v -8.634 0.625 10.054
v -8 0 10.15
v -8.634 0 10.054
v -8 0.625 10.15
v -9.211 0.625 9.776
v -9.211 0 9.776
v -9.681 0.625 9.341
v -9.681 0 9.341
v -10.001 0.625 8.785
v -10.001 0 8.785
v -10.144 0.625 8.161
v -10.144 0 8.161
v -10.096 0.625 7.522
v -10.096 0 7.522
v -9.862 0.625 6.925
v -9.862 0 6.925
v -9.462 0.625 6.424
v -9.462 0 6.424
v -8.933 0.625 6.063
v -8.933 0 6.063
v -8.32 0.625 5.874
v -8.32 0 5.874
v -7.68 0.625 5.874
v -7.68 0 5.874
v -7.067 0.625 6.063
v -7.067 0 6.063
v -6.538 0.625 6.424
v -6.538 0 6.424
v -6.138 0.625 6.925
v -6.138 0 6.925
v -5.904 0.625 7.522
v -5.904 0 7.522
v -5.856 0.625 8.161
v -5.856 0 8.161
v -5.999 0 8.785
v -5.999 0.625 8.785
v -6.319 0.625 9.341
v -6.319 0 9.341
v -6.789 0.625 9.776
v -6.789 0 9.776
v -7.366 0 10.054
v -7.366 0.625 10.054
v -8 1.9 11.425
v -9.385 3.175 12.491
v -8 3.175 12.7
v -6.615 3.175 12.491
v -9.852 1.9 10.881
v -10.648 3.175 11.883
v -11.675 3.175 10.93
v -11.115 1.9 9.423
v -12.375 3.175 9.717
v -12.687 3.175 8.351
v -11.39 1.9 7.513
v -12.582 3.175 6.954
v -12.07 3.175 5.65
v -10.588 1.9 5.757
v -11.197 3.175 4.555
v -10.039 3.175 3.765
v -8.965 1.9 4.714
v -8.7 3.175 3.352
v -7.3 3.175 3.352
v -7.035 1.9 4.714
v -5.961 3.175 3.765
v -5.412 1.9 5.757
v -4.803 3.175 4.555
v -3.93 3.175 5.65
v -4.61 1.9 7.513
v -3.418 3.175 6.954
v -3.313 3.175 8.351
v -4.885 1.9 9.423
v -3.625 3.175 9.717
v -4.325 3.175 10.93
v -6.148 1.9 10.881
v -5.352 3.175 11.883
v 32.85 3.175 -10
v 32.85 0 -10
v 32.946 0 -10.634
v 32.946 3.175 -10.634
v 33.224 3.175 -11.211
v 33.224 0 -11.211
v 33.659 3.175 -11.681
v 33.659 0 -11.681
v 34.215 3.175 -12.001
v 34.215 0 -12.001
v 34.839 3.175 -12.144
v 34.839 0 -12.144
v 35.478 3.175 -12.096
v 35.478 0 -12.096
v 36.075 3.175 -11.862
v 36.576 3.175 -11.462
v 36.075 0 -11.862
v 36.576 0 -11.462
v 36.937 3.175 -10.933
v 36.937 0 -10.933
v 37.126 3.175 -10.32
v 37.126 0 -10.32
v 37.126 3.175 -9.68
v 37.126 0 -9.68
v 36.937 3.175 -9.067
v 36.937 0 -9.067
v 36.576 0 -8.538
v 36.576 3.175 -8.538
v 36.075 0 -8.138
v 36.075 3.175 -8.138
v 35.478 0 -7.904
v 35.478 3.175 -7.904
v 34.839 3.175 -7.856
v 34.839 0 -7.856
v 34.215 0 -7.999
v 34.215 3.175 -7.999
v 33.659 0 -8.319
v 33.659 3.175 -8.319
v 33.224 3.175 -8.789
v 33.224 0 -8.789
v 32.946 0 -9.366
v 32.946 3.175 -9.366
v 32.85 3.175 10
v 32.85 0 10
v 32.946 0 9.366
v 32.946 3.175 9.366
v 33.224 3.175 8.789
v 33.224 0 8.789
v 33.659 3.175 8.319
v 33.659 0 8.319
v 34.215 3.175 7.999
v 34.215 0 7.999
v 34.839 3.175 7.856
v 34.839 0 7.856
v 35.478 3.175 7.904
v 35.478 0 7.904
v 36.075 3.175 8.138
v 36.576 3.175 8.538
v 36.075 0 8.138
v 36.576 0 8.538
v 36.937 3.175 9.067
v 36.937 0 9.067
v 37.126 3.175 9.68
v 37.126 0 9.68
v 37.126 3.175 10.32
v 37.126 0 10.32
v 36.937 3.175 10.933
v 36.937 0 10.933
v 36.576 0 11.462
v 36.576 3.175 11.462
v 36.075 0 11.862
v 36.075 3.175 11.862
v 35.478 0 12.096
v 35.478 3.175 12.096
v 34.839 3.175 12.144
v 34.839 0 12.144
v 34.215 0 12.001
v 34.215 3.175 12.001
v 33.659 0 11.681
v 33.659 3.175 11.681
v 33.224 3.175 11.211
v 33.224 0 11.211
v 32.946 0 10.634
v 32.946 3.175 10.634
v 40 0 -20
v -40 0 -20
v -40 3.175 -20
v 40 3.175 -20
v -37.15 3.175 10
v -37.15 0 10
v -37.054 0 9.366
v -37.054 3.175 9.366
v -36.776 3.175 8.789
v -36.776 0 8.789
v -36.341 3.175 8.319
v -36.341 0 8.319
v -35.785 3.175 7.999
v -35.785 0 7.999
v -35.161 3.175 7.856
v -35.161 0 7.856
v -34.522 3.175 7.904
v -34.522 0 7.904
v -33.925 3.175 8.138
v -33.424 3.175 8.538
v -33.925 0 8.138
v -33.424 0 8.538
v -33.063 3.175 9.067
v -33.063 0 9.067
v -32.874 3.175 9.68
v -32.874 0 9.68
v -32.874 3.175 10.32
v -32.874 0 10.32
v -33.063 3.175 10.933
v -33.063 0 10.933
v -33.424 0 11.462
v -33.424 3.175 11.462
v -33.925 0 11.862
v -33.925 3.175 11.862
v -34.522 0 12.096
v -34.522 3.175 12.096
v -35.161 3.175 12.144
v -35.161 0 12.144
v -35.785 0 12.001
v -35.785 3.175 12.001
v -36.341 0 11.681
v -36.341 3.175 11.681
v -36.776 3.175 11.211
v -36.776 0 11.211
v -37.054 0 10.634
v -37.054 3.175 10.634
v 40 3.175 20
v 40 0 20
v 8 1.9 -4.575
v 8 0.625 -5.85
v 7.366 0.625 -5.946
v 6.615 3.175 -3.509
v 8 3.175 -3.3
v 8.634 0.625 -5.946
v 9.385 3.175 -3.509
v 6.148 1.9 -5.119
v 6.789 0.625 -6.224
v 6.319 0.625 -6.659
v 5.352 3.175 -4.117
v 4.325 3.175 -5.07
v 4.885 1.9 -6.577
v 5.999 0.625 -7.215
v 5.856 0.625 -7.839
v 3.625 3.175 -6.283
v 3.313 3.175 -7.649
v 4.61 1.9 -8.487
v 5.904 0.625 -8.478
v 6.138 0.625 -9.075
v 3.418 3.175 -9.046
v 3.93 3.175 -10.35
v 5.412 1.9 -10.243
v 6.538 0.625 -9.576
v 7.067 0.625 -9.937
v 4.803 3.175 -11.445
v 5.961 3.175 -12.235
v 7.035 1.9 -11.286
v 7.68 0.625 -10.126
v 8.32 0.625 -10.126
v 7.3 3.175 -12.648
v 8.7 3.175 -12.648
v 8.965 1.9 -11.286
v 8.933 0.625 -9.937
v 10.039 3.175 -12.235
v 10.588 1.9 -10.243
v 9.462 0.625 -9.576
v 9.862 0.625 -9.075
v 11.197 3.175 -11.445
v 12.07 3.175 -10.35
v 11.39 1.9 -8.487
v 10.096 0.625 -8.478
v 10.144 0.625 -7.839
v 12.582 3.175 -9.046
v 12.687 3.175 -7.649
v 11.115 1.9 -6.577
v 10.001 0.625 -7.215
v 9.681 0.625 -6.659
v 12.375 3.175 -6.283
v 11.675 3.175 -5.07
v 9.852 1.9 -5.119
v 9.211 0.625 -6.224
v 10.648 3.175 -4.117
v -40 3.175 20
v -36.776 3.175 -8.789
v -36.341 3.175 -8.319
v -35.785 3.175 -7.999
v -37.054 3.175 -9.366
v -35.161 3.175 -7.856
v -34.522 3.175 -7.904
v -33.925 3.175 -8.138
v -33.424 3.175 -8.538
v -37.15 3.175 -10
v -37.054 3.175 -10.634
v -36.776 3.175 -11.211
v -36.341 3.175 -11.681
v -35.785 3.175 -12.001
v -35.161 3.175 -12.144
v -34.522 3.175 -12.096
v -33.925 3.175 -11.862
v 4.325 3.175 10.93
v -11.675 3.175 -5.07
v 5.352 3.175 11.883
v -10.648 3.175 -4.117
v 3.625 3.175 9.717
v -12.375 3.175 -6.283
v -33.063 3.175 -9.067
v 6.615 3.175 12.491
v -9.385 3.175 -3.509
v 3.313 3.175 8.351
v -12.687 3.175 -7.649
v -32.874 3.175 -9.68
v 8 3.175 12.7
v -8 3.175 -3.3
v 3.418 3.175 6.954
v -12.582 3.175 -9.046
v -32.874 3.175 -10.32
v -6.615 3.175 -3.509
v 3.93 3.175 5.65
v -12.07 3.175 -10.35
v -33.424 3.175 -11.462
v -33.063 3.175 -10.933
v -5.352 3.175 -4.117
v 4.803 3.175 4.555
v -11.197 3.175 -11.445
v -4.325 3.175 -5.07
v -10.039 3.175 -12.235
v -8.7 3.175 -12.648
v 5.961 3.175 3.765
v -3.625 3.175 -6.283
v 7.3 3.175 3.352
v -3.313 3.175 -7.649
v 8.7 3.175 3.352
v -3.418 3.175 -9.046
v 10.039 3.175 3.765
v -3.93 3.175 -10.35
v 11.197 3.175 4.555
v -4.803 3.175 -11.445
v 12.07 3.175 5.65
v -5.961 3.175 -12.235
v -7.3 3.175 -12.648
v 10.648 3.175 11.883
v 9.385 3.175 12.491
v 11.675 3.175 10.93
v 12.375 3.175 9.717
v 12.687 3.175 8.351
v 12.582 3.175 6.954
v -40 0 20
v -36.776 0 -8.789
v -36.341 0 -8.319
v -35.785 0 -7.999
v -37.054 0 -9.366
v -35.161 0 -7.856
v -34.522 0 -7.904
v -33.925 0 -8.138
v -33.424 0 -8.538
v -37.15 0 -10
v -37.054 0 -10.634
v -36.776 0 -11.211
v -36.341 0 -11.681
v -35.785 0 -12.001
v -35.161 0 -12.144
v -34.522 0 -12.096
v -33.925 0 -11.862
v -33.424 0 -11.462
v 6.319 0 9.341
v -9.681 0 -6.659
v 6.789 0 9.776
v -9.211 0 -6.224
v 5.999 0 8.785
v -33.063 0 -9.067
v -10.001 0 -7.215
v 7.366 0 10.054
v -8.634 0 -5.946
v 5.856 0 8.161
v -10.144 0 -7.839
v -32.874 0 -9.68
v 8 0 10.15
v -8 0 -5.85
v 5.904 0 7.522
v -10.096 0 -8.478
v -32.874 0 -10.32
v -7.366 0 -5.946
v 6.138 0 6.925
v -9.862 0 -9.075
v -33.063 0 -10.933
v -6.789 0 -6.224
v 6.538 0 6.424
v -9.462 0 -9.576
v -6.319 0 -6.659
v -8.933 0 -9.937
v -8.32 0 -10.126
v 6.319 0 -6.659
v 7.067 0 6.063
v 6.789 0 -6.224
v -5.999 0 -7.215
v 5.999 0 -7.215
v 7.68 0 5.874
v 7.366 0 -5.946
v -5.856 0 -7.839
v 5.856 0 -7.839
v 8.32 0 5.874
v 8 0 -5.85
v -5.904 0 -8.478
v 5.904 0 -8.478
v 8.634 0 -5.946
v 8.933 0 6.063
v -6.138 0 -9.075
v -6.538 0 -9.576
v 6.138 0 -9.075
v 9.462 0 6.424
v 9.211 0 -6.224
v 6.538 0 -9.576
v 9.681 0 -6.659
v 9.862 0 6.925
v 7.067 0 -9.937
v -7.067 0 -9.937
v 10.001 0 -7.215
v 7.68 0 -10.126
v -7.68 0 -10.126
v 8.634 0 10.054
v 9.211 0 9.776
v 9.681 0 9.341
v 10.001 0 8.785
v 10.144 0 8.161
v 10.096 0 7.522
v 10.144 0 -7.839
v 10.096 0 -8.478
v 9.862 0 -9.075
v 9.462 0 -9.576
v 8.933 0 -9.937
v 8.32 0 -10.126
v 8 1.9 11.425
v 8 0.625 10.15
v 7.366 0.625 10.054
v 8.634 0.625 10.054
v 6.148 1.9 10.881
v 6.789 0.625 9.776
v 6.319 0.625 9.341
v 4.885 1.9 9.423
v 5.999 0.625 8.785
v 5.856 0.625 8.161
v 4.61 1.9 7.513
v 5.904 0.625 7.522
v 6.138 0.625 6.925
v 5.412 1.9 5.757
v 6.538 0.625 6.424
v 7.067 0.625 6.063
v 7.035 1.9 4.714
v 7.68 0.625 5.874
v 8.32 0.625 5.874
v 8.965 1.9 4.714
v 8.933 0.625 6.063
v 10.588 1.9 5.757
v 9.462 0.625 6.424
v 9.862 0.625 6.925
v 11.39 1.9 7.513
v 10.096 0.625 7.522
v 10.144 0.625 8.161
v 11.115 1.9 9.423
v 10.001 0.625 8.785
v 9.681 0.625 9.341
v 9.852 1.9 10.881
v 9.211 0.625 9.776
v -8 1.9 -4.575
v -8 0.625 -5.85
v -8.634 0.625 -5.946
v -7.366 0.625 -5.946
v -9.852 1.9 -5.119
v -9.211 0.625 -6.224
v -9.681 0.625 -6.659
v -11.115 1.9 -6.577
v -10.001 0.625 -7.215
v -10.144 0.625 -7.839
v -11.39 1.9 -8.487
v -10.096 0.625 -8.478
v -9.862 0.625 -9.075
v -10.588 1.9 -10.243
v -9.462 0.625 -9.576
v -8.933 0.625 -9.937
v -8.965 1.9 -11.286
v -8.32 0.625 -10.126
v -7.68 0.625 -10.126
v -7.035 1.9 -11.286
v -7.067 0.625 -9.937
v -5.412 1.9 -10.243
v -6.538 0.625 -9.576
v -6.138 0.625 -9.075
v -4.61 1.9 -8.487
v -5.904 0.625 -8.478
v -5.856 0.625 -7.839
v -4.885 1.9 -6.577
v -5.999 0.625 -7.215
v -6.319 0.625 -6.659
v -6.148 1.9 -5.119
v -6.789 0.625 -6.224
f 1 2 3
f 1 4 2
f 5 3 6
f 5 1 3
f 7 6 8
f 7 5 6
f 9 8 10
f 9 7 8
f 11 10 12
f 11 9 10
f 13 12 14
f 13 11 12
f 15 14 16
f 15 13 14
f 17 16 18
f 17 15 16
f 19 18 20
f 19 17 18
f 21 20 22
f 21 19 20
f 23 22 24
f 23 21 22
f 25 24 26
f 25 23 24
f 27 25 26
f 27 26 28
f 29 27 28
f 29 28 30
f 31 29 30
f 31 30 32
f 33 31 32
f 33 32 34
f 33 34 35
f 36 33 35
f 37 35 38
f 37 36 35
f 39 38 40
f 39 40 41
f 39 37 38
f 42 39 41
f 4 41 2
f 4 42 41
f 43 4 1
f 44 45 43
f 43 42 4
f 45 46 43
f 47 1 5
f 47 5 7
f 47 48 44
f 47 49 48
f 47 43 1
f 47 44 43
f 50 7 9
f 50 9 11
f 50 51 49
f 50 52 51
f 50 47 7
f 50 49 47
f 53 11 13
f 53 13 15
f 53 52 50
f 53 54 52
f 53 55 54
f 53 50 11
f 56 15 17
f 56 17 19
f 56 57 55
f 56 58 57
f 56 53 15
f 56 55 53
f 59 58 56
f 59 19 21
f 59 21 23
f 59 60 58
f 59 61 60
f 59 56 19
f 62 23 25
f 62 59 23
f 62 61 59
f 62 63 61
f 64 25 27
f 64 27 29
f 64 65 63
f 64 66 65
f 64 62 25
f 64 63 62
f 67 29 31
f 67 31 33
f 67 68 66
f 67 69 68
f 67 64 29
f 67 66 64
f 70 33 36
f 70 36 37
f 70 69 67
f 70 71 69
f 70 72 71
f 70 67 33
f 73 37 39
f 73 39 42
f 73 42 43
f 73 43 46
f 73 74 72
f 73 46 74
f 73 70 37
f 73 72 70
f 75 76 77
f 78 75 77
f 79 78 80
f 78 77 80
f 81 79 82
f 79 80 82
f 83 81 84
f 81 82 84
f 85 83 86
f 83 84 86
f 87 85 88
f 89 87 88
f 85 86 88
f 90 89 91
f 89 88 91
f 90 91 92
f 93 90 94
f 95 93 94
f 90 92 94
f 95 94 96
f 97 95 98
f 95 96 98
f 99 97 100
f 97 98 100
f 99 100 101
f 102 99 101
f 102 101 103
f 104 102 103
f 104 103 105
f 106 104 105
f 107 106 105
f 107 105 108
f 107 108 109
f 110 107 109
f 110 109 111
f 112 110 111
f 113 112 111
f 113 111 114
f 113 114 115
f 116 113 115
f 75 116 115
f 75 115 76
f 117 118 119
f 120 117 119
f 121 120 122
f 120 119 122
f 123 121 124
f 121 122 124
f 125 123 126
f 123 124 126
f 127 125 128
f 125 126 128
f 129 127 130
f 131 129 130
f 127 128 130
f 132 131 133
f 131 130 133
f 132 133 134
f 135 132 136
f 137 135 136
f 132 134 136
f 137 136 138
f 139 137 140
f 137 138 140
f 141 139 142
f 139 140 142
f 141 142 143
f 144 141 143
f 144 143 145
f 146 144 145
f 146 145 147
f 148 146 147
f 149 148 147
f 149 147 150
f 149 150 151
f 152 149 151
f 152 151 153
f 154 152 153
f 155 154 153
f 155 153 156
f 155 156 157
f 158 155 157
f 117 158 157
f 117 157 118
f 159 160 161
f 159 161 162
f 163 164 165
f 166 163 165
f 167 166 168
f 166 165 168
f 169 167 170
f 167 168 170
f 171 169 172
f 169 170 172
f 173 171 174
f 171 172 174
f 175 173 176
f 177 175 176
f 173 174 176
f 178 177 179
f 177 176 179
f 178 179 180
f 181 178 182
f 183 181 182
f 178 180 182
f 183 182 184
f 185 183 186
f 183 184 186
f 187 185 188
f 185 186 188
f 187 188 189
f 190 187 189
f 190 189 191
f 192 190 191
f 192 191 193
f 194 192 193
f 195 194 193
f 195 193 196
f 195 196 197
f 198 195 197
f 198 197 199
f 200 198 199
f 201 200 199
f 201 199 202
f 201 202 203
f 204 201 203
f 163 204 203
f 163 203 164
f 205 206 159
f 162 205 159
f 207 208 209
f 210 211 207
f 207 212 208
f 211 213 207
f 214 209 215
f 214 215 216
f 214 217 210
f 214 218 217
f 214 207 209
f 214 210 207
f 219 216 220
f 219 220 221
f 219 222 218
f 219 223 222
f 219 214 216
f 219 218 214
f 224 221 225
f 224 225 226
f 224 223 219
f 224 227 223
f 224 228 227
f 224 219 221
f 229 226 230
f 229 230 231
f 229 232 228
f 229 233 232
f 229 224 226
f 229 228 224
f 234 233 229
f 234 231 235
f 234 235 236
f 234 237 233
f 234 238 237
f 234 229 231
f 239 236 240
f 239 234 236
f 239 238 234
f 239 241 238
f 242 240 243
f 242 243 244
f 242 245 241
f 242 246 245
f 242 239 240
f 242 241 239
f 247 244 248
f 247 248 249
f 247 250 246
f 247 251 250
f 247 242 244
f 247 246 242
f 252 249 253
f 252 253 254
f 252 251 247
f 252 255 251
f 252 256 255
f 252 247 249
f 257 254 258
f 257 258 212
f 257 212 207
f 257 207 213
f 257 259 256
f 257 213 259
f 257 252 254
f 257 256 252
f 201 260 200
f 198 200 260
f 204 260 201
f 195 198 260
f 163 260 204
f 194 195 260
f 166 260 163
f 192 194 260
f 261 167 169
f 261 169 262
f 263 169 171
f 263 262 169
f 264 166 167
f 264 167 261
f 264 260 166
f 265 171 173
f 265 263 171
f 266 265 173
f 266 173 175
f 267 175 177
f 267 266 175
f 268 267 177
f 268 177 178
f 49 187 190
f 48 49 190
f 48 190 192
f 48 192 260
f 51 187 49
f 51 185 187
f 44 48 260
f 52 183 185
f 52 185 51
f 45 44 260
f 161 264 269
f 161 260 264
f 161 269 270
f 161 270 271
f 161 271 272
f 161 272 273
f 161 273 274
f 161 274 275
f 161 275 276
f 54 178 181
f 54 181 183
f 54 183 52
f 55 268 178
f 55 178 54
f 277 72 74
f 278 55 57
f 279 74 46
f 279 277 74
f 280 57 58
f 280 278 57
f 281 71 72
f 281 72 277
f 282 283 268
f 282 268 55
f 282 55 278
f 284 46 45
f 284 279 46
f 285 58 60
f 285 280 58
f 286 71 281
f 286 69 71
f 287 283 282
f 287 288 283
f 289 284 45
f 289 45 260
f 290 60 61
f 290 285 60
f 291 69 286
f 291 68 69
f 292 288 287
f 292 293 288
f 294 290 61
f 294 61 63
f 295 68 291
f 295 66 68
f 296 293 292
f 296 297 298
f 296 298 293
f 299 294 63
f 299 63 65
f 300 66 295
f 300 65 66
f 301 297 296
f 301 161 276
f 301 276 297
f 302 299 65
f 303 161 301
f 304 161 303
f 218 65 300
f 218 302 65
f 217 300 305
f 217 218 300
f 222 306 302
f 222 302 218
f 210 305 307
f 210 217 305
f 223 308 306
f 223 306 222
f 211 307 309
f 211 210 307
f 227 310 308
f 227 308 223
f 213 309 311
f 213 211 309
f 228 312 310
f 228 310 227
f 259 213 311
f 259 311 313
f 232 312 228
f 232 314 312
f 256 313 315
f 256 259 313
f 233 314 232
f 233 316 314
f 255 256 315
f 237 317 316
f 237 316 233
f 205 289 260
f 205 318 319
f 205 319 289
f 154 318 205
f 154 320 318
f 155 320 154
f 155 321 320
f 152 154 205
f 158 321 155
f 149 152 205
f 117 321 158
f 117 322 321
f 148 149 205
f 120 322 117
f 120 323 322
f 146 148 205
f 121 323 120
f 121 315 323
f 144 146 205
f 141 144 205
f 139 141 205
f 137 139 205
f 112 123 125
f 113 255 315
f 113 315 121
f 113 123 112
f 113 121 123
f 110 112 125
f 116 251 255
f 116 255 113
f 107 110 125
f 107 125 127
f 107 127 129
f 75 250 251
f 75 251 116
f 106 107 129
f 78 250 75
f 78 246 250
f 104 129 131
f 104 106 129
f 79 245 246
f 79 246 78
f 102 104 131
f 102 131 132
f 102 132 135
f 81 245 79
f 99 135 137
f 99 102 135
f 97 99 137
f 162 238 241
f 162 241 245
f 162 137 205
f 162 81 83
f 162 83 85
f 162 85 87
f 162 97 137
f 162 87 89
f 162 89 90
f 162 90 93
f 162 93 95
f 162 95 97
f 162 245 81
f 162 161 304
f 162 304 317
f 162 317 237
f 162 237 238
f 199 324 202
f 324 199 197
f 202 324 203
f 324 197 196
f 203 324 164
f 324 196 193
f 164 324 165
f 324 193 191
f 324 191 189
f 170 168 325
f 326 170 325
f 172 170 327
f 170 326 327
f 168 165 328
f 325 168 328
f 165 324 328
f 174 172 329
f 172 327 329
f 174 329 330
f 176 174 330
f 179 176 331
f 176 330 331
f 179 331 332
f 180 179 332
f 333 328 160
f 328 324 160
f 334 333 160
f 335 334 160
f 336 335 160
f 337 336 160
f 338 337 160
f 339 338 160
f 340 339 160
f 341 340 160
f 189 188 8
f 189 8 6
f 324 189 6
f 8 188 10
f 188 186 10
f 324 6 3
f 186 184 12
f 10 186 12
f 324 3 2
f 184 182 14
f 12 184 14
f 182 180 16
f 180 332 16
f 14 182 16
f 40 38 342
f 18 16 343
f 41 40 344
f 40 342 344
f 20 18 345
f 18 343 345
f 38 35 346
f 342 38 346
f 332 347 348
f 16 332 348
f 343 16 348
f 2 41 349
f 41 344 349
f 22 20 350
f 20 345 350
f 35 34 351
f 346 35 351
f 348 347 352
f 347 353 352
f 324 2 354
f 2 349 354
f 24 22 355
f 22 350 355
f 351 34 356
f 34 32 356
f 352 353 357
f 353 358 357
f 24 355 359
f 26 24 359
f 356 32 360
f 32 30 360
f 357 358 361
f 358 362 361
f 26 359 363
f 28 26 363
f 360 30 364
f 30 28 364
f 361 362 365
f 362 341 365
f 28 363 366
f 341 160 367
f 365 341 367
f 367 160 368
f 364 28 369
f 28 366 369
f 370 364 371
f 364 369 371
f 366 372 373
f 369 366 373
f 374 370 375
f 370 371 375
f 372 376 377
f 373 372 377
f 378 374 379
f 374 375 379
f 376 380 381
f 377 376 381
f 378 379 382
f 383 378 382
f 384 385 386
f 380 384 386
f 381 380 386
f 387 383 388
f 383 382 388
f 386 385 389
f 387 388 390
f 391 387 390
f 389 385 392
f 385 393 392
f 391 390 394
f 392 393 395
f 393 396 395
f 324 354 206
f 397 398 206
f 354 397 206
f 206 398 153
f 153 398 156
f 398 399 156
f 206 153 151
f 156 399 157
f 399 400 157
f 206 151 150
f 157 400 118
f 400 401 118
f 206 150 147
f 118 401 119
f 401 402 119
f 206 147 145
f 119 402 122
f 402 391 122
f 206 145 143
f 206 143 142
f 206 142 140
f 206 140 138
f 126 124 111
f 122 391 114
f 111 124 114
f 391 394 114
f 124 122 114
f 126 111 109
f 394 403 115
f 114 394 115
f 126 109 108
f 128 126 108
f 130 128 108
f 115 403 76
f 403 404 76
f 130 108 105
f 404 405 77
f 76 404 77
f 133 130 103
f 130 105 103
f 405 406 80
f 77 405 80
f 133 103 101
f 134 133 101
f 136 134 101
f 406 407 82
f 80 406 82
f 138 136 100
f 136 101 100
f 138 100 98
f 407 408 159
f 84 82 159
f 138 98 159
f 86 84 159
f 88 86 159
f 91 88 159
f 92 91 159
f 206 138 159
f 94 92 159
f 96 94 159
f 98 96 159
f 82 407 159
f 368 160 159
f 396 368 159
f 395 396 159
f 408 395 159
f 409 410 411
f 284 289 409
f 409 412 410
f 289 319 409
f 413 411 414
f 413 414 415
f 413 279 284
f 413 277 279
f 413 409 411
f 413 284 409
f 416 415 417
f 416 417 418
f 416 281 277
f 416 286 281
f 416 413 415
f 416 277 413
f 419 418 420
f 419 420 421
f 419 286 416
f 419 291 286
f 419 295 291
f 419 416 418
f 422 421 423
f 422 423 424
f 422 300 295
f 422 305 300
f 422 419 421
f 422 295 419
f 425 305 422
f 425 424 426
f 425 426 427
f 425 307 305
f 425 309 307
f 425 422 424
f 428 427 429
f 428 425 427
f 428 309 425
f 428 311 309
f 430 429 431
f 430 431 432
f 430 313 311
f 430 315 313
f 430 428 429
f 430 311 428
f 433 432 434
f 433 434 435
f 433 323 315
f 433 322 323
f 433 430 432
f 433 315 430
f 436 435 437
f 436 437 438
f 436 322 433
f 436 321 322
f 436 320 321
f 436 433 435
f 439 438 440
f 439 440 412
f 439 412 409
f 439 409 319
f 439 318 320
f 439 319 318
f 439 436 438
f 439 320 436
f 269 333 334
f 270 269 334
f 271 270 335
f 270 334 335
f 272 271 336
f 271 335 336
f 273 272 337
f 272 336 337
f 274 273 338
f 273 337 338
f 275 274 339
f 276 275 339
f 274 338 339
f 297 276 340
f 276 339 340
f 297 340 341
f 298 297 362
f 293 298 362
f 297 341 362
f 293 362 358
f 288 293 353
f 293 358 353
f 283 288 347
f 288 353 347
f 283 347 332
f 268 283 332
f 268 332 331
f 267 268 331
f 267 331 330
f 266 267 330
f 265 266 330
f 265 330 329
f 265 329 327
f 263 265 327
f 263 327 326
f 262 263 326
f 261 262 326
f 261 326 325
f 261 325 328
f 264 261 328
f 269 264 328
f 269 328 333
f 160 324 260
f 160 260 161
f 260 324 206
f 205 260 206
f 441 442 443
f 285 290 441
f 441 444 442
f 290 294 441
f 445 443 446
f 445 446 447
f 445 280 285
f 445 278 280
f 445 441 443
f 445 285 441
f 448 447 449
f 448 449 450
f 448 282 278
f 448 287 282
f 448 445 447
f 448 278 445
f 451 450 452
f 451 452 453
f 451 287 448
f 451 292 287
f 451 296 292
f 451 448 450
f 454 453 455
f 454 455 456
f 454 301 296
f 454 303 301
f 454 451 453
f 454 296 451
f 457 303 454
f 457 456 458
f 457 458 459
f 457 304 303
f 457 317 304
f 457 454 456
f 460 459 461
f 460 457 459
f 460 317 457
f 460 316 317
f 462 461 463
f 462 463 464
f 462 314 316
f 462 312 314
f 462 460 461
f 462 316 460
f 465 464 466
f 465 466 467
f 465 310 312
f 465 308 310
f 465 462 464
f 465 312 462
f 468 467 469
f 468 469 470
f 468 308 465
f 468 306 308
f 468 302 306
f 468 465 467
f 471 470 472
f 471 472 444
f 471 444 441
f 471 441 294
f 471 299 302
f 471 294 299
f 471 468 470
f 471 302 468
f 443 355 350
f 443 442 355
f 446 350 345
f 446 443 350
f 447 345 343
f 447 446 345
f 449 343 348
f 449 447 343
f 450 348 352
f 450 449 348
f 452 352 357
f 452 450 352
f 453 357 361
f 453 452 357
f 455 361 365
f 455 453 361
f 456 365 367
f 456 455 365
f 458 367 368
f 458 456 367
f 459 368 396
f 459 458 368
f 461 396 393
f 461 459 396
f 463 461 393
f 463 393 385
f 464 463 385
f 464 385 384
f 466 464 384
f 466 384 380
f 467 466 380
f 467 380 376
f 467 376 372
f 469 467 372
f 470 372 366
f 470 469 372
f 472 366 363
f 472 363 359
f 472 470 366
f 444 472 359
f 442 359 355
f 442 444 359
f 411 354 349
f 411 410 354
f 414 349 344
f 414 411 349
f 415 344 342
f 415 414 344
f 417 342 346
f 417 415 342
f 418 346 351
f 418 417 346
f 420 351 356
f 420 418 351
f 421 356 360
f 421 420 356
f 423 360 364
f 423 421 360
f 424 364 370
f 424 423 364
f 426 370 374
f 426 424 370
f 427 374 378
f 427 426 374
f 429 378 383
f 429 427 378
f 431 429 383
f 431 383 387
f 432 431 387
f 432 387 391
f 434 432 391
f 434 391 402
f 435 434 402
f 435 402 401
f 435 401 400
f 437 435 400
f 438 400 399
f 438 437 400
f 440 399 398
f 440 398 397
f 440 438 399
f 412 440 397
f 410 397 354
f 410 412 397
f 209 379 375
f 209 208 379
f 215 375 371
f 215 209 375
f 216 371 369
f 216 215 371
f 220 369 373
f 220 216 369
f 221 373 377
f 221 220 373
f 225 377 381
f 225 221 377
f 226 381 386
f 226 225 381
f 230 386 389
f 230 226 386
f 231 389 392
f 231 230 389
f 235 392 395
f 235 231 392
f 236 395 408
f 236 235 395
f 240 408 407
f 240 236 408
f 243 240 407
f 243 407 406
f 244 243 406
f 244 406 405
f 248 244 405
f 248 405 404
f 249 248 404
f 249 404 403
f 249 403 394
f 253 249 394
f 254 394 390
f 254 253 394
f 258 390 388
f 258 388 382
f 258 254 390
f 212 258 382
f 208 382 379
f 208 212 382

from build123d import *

# Parameters (mm, degrees)
SKETCH2_W                                      = 80
SKETCH2_H                                      = 40
BOSS_EXTRUDE1_DEPTH                            = 3.175
M4_CLEARANCE_HOLE1_D                           = 4.3
CSK_FOR_M4_FLAT_HEAD_MACHINE_SCREW2_AT_2_COUNT = 2
CSK_FOR_M4_FLAT_HEAD_MACHINE_SCREW2_AT_2_PITCH = 16
CSK_FOR_M4_FLAT_HEAD_MACHINE_SCREW2_AT_3_COUNT = 2
CSK_FOR_M4_FLAT_HEAD_MACHINE_SCREW2_AT_3_PITCH = 22.627416998
CSK_FOR_M4_FLAT_HEAD_MACHINE_SCREW2_AT_4_COUNT = 2
CSK_FOR_M4_FLAT_HEAD_MACHINE_SCREW2_AT_4_PITCH = 16


with BuildPart() as part:
    # Sketch2 → Boss-Extrude1 (new body)
    with BuildSketch(Plane(origin=(0, 0, 0), x_dir=(1, 0, 0), z_dir=(0, 1, 0))):
        Rectangle(SKETCH2_W, SKETCH2_H)
    extrude(amount=BOSS_EXTRUDE1_DEPTH)

    # M4 Clearance Hole1 (through all)
    with Locations(Plane(origin=(0, 3.175, 0), x_dir=(1, 0, 0), z_dir=(0, 1, 0))):
        with Locations((-35, 10), (35, 10), (35, -10), (-35, -10)):
            Hole(M4_CLEARANCE_HOLE1_D / 2)

    # Sketch6 → CSK for M4 Flat Head Machine Screw2 (revolve, cut)
    with BuildSketch(Plane(origin=(-8, 3.175, -8), x_dir=(0, 0, 1), z_dir=(1, 0, 0))):
        Polygon((0, 0), (0, 3.175), (2.15, 3.175), (2.15, 2.55), (4.7, 0), align=None)
    csk_for_m4_flat_head_machine_screw2 = revolve(axis=Axis((-8, 9.525, -8), (0, -1, 0)), mode=Mode.SUBTRACT)

    # CSK for M4 Flat Head Machine Screw2 at 2: CSK for M4 Flat Head Machine Screw2 ×2
    with Locations(*[(i * CSK_FOR_M4_FLAT_HEAD_MACHINE_SCREW2_AT_2_PITCH, 0, 0) for i in range(1, CSK_FOR_M4_FLAT_HEAD_MACHINE_SCREW2_AT_2_COUNT)]):
        add(csk_for_m4_flat_head_machine_screw2, mode=Mode.SUBTRACT)

    # CSK for M4 Flat Head Machine Screw2 at 3: CSK for M4 Flat Head Machine Screw2 ×2
    with Locations(*[Vector(0.707106781186545, 0, 0.70710678118655) * (i * CSK_FOR_M4_FLAT_HEAD_MACHINE_SCREW2_AT_3_PITCH) for i in range(1, CSK_FOR_M4_FLAT_HEAD_MACHINE_SCREW2_AT_3_COUNT)]):
        add(csk_for_m4_flat_head_machine_screw2, mode=Mode.SUBTRACT)

    # CSK for M4 Flat Head Machine Screw2 at 4: CSK for M4 Flat Head Machine Screw2 ×2
    with Locations(*[(0, 0, i * CSK_FOR_M4_FLAT_HEAD_MACHINE_SCREW2_AT_4_PITCH) for i in range(1, CSK_FOR_M4_FLAT_HEAD_MACHINE_SCREW2_AT_4_COUNT)]):
        add(csk_for_m4_flat_head_machine_screw2, mode=Mode.SUBTRACT)


solid = part.part
